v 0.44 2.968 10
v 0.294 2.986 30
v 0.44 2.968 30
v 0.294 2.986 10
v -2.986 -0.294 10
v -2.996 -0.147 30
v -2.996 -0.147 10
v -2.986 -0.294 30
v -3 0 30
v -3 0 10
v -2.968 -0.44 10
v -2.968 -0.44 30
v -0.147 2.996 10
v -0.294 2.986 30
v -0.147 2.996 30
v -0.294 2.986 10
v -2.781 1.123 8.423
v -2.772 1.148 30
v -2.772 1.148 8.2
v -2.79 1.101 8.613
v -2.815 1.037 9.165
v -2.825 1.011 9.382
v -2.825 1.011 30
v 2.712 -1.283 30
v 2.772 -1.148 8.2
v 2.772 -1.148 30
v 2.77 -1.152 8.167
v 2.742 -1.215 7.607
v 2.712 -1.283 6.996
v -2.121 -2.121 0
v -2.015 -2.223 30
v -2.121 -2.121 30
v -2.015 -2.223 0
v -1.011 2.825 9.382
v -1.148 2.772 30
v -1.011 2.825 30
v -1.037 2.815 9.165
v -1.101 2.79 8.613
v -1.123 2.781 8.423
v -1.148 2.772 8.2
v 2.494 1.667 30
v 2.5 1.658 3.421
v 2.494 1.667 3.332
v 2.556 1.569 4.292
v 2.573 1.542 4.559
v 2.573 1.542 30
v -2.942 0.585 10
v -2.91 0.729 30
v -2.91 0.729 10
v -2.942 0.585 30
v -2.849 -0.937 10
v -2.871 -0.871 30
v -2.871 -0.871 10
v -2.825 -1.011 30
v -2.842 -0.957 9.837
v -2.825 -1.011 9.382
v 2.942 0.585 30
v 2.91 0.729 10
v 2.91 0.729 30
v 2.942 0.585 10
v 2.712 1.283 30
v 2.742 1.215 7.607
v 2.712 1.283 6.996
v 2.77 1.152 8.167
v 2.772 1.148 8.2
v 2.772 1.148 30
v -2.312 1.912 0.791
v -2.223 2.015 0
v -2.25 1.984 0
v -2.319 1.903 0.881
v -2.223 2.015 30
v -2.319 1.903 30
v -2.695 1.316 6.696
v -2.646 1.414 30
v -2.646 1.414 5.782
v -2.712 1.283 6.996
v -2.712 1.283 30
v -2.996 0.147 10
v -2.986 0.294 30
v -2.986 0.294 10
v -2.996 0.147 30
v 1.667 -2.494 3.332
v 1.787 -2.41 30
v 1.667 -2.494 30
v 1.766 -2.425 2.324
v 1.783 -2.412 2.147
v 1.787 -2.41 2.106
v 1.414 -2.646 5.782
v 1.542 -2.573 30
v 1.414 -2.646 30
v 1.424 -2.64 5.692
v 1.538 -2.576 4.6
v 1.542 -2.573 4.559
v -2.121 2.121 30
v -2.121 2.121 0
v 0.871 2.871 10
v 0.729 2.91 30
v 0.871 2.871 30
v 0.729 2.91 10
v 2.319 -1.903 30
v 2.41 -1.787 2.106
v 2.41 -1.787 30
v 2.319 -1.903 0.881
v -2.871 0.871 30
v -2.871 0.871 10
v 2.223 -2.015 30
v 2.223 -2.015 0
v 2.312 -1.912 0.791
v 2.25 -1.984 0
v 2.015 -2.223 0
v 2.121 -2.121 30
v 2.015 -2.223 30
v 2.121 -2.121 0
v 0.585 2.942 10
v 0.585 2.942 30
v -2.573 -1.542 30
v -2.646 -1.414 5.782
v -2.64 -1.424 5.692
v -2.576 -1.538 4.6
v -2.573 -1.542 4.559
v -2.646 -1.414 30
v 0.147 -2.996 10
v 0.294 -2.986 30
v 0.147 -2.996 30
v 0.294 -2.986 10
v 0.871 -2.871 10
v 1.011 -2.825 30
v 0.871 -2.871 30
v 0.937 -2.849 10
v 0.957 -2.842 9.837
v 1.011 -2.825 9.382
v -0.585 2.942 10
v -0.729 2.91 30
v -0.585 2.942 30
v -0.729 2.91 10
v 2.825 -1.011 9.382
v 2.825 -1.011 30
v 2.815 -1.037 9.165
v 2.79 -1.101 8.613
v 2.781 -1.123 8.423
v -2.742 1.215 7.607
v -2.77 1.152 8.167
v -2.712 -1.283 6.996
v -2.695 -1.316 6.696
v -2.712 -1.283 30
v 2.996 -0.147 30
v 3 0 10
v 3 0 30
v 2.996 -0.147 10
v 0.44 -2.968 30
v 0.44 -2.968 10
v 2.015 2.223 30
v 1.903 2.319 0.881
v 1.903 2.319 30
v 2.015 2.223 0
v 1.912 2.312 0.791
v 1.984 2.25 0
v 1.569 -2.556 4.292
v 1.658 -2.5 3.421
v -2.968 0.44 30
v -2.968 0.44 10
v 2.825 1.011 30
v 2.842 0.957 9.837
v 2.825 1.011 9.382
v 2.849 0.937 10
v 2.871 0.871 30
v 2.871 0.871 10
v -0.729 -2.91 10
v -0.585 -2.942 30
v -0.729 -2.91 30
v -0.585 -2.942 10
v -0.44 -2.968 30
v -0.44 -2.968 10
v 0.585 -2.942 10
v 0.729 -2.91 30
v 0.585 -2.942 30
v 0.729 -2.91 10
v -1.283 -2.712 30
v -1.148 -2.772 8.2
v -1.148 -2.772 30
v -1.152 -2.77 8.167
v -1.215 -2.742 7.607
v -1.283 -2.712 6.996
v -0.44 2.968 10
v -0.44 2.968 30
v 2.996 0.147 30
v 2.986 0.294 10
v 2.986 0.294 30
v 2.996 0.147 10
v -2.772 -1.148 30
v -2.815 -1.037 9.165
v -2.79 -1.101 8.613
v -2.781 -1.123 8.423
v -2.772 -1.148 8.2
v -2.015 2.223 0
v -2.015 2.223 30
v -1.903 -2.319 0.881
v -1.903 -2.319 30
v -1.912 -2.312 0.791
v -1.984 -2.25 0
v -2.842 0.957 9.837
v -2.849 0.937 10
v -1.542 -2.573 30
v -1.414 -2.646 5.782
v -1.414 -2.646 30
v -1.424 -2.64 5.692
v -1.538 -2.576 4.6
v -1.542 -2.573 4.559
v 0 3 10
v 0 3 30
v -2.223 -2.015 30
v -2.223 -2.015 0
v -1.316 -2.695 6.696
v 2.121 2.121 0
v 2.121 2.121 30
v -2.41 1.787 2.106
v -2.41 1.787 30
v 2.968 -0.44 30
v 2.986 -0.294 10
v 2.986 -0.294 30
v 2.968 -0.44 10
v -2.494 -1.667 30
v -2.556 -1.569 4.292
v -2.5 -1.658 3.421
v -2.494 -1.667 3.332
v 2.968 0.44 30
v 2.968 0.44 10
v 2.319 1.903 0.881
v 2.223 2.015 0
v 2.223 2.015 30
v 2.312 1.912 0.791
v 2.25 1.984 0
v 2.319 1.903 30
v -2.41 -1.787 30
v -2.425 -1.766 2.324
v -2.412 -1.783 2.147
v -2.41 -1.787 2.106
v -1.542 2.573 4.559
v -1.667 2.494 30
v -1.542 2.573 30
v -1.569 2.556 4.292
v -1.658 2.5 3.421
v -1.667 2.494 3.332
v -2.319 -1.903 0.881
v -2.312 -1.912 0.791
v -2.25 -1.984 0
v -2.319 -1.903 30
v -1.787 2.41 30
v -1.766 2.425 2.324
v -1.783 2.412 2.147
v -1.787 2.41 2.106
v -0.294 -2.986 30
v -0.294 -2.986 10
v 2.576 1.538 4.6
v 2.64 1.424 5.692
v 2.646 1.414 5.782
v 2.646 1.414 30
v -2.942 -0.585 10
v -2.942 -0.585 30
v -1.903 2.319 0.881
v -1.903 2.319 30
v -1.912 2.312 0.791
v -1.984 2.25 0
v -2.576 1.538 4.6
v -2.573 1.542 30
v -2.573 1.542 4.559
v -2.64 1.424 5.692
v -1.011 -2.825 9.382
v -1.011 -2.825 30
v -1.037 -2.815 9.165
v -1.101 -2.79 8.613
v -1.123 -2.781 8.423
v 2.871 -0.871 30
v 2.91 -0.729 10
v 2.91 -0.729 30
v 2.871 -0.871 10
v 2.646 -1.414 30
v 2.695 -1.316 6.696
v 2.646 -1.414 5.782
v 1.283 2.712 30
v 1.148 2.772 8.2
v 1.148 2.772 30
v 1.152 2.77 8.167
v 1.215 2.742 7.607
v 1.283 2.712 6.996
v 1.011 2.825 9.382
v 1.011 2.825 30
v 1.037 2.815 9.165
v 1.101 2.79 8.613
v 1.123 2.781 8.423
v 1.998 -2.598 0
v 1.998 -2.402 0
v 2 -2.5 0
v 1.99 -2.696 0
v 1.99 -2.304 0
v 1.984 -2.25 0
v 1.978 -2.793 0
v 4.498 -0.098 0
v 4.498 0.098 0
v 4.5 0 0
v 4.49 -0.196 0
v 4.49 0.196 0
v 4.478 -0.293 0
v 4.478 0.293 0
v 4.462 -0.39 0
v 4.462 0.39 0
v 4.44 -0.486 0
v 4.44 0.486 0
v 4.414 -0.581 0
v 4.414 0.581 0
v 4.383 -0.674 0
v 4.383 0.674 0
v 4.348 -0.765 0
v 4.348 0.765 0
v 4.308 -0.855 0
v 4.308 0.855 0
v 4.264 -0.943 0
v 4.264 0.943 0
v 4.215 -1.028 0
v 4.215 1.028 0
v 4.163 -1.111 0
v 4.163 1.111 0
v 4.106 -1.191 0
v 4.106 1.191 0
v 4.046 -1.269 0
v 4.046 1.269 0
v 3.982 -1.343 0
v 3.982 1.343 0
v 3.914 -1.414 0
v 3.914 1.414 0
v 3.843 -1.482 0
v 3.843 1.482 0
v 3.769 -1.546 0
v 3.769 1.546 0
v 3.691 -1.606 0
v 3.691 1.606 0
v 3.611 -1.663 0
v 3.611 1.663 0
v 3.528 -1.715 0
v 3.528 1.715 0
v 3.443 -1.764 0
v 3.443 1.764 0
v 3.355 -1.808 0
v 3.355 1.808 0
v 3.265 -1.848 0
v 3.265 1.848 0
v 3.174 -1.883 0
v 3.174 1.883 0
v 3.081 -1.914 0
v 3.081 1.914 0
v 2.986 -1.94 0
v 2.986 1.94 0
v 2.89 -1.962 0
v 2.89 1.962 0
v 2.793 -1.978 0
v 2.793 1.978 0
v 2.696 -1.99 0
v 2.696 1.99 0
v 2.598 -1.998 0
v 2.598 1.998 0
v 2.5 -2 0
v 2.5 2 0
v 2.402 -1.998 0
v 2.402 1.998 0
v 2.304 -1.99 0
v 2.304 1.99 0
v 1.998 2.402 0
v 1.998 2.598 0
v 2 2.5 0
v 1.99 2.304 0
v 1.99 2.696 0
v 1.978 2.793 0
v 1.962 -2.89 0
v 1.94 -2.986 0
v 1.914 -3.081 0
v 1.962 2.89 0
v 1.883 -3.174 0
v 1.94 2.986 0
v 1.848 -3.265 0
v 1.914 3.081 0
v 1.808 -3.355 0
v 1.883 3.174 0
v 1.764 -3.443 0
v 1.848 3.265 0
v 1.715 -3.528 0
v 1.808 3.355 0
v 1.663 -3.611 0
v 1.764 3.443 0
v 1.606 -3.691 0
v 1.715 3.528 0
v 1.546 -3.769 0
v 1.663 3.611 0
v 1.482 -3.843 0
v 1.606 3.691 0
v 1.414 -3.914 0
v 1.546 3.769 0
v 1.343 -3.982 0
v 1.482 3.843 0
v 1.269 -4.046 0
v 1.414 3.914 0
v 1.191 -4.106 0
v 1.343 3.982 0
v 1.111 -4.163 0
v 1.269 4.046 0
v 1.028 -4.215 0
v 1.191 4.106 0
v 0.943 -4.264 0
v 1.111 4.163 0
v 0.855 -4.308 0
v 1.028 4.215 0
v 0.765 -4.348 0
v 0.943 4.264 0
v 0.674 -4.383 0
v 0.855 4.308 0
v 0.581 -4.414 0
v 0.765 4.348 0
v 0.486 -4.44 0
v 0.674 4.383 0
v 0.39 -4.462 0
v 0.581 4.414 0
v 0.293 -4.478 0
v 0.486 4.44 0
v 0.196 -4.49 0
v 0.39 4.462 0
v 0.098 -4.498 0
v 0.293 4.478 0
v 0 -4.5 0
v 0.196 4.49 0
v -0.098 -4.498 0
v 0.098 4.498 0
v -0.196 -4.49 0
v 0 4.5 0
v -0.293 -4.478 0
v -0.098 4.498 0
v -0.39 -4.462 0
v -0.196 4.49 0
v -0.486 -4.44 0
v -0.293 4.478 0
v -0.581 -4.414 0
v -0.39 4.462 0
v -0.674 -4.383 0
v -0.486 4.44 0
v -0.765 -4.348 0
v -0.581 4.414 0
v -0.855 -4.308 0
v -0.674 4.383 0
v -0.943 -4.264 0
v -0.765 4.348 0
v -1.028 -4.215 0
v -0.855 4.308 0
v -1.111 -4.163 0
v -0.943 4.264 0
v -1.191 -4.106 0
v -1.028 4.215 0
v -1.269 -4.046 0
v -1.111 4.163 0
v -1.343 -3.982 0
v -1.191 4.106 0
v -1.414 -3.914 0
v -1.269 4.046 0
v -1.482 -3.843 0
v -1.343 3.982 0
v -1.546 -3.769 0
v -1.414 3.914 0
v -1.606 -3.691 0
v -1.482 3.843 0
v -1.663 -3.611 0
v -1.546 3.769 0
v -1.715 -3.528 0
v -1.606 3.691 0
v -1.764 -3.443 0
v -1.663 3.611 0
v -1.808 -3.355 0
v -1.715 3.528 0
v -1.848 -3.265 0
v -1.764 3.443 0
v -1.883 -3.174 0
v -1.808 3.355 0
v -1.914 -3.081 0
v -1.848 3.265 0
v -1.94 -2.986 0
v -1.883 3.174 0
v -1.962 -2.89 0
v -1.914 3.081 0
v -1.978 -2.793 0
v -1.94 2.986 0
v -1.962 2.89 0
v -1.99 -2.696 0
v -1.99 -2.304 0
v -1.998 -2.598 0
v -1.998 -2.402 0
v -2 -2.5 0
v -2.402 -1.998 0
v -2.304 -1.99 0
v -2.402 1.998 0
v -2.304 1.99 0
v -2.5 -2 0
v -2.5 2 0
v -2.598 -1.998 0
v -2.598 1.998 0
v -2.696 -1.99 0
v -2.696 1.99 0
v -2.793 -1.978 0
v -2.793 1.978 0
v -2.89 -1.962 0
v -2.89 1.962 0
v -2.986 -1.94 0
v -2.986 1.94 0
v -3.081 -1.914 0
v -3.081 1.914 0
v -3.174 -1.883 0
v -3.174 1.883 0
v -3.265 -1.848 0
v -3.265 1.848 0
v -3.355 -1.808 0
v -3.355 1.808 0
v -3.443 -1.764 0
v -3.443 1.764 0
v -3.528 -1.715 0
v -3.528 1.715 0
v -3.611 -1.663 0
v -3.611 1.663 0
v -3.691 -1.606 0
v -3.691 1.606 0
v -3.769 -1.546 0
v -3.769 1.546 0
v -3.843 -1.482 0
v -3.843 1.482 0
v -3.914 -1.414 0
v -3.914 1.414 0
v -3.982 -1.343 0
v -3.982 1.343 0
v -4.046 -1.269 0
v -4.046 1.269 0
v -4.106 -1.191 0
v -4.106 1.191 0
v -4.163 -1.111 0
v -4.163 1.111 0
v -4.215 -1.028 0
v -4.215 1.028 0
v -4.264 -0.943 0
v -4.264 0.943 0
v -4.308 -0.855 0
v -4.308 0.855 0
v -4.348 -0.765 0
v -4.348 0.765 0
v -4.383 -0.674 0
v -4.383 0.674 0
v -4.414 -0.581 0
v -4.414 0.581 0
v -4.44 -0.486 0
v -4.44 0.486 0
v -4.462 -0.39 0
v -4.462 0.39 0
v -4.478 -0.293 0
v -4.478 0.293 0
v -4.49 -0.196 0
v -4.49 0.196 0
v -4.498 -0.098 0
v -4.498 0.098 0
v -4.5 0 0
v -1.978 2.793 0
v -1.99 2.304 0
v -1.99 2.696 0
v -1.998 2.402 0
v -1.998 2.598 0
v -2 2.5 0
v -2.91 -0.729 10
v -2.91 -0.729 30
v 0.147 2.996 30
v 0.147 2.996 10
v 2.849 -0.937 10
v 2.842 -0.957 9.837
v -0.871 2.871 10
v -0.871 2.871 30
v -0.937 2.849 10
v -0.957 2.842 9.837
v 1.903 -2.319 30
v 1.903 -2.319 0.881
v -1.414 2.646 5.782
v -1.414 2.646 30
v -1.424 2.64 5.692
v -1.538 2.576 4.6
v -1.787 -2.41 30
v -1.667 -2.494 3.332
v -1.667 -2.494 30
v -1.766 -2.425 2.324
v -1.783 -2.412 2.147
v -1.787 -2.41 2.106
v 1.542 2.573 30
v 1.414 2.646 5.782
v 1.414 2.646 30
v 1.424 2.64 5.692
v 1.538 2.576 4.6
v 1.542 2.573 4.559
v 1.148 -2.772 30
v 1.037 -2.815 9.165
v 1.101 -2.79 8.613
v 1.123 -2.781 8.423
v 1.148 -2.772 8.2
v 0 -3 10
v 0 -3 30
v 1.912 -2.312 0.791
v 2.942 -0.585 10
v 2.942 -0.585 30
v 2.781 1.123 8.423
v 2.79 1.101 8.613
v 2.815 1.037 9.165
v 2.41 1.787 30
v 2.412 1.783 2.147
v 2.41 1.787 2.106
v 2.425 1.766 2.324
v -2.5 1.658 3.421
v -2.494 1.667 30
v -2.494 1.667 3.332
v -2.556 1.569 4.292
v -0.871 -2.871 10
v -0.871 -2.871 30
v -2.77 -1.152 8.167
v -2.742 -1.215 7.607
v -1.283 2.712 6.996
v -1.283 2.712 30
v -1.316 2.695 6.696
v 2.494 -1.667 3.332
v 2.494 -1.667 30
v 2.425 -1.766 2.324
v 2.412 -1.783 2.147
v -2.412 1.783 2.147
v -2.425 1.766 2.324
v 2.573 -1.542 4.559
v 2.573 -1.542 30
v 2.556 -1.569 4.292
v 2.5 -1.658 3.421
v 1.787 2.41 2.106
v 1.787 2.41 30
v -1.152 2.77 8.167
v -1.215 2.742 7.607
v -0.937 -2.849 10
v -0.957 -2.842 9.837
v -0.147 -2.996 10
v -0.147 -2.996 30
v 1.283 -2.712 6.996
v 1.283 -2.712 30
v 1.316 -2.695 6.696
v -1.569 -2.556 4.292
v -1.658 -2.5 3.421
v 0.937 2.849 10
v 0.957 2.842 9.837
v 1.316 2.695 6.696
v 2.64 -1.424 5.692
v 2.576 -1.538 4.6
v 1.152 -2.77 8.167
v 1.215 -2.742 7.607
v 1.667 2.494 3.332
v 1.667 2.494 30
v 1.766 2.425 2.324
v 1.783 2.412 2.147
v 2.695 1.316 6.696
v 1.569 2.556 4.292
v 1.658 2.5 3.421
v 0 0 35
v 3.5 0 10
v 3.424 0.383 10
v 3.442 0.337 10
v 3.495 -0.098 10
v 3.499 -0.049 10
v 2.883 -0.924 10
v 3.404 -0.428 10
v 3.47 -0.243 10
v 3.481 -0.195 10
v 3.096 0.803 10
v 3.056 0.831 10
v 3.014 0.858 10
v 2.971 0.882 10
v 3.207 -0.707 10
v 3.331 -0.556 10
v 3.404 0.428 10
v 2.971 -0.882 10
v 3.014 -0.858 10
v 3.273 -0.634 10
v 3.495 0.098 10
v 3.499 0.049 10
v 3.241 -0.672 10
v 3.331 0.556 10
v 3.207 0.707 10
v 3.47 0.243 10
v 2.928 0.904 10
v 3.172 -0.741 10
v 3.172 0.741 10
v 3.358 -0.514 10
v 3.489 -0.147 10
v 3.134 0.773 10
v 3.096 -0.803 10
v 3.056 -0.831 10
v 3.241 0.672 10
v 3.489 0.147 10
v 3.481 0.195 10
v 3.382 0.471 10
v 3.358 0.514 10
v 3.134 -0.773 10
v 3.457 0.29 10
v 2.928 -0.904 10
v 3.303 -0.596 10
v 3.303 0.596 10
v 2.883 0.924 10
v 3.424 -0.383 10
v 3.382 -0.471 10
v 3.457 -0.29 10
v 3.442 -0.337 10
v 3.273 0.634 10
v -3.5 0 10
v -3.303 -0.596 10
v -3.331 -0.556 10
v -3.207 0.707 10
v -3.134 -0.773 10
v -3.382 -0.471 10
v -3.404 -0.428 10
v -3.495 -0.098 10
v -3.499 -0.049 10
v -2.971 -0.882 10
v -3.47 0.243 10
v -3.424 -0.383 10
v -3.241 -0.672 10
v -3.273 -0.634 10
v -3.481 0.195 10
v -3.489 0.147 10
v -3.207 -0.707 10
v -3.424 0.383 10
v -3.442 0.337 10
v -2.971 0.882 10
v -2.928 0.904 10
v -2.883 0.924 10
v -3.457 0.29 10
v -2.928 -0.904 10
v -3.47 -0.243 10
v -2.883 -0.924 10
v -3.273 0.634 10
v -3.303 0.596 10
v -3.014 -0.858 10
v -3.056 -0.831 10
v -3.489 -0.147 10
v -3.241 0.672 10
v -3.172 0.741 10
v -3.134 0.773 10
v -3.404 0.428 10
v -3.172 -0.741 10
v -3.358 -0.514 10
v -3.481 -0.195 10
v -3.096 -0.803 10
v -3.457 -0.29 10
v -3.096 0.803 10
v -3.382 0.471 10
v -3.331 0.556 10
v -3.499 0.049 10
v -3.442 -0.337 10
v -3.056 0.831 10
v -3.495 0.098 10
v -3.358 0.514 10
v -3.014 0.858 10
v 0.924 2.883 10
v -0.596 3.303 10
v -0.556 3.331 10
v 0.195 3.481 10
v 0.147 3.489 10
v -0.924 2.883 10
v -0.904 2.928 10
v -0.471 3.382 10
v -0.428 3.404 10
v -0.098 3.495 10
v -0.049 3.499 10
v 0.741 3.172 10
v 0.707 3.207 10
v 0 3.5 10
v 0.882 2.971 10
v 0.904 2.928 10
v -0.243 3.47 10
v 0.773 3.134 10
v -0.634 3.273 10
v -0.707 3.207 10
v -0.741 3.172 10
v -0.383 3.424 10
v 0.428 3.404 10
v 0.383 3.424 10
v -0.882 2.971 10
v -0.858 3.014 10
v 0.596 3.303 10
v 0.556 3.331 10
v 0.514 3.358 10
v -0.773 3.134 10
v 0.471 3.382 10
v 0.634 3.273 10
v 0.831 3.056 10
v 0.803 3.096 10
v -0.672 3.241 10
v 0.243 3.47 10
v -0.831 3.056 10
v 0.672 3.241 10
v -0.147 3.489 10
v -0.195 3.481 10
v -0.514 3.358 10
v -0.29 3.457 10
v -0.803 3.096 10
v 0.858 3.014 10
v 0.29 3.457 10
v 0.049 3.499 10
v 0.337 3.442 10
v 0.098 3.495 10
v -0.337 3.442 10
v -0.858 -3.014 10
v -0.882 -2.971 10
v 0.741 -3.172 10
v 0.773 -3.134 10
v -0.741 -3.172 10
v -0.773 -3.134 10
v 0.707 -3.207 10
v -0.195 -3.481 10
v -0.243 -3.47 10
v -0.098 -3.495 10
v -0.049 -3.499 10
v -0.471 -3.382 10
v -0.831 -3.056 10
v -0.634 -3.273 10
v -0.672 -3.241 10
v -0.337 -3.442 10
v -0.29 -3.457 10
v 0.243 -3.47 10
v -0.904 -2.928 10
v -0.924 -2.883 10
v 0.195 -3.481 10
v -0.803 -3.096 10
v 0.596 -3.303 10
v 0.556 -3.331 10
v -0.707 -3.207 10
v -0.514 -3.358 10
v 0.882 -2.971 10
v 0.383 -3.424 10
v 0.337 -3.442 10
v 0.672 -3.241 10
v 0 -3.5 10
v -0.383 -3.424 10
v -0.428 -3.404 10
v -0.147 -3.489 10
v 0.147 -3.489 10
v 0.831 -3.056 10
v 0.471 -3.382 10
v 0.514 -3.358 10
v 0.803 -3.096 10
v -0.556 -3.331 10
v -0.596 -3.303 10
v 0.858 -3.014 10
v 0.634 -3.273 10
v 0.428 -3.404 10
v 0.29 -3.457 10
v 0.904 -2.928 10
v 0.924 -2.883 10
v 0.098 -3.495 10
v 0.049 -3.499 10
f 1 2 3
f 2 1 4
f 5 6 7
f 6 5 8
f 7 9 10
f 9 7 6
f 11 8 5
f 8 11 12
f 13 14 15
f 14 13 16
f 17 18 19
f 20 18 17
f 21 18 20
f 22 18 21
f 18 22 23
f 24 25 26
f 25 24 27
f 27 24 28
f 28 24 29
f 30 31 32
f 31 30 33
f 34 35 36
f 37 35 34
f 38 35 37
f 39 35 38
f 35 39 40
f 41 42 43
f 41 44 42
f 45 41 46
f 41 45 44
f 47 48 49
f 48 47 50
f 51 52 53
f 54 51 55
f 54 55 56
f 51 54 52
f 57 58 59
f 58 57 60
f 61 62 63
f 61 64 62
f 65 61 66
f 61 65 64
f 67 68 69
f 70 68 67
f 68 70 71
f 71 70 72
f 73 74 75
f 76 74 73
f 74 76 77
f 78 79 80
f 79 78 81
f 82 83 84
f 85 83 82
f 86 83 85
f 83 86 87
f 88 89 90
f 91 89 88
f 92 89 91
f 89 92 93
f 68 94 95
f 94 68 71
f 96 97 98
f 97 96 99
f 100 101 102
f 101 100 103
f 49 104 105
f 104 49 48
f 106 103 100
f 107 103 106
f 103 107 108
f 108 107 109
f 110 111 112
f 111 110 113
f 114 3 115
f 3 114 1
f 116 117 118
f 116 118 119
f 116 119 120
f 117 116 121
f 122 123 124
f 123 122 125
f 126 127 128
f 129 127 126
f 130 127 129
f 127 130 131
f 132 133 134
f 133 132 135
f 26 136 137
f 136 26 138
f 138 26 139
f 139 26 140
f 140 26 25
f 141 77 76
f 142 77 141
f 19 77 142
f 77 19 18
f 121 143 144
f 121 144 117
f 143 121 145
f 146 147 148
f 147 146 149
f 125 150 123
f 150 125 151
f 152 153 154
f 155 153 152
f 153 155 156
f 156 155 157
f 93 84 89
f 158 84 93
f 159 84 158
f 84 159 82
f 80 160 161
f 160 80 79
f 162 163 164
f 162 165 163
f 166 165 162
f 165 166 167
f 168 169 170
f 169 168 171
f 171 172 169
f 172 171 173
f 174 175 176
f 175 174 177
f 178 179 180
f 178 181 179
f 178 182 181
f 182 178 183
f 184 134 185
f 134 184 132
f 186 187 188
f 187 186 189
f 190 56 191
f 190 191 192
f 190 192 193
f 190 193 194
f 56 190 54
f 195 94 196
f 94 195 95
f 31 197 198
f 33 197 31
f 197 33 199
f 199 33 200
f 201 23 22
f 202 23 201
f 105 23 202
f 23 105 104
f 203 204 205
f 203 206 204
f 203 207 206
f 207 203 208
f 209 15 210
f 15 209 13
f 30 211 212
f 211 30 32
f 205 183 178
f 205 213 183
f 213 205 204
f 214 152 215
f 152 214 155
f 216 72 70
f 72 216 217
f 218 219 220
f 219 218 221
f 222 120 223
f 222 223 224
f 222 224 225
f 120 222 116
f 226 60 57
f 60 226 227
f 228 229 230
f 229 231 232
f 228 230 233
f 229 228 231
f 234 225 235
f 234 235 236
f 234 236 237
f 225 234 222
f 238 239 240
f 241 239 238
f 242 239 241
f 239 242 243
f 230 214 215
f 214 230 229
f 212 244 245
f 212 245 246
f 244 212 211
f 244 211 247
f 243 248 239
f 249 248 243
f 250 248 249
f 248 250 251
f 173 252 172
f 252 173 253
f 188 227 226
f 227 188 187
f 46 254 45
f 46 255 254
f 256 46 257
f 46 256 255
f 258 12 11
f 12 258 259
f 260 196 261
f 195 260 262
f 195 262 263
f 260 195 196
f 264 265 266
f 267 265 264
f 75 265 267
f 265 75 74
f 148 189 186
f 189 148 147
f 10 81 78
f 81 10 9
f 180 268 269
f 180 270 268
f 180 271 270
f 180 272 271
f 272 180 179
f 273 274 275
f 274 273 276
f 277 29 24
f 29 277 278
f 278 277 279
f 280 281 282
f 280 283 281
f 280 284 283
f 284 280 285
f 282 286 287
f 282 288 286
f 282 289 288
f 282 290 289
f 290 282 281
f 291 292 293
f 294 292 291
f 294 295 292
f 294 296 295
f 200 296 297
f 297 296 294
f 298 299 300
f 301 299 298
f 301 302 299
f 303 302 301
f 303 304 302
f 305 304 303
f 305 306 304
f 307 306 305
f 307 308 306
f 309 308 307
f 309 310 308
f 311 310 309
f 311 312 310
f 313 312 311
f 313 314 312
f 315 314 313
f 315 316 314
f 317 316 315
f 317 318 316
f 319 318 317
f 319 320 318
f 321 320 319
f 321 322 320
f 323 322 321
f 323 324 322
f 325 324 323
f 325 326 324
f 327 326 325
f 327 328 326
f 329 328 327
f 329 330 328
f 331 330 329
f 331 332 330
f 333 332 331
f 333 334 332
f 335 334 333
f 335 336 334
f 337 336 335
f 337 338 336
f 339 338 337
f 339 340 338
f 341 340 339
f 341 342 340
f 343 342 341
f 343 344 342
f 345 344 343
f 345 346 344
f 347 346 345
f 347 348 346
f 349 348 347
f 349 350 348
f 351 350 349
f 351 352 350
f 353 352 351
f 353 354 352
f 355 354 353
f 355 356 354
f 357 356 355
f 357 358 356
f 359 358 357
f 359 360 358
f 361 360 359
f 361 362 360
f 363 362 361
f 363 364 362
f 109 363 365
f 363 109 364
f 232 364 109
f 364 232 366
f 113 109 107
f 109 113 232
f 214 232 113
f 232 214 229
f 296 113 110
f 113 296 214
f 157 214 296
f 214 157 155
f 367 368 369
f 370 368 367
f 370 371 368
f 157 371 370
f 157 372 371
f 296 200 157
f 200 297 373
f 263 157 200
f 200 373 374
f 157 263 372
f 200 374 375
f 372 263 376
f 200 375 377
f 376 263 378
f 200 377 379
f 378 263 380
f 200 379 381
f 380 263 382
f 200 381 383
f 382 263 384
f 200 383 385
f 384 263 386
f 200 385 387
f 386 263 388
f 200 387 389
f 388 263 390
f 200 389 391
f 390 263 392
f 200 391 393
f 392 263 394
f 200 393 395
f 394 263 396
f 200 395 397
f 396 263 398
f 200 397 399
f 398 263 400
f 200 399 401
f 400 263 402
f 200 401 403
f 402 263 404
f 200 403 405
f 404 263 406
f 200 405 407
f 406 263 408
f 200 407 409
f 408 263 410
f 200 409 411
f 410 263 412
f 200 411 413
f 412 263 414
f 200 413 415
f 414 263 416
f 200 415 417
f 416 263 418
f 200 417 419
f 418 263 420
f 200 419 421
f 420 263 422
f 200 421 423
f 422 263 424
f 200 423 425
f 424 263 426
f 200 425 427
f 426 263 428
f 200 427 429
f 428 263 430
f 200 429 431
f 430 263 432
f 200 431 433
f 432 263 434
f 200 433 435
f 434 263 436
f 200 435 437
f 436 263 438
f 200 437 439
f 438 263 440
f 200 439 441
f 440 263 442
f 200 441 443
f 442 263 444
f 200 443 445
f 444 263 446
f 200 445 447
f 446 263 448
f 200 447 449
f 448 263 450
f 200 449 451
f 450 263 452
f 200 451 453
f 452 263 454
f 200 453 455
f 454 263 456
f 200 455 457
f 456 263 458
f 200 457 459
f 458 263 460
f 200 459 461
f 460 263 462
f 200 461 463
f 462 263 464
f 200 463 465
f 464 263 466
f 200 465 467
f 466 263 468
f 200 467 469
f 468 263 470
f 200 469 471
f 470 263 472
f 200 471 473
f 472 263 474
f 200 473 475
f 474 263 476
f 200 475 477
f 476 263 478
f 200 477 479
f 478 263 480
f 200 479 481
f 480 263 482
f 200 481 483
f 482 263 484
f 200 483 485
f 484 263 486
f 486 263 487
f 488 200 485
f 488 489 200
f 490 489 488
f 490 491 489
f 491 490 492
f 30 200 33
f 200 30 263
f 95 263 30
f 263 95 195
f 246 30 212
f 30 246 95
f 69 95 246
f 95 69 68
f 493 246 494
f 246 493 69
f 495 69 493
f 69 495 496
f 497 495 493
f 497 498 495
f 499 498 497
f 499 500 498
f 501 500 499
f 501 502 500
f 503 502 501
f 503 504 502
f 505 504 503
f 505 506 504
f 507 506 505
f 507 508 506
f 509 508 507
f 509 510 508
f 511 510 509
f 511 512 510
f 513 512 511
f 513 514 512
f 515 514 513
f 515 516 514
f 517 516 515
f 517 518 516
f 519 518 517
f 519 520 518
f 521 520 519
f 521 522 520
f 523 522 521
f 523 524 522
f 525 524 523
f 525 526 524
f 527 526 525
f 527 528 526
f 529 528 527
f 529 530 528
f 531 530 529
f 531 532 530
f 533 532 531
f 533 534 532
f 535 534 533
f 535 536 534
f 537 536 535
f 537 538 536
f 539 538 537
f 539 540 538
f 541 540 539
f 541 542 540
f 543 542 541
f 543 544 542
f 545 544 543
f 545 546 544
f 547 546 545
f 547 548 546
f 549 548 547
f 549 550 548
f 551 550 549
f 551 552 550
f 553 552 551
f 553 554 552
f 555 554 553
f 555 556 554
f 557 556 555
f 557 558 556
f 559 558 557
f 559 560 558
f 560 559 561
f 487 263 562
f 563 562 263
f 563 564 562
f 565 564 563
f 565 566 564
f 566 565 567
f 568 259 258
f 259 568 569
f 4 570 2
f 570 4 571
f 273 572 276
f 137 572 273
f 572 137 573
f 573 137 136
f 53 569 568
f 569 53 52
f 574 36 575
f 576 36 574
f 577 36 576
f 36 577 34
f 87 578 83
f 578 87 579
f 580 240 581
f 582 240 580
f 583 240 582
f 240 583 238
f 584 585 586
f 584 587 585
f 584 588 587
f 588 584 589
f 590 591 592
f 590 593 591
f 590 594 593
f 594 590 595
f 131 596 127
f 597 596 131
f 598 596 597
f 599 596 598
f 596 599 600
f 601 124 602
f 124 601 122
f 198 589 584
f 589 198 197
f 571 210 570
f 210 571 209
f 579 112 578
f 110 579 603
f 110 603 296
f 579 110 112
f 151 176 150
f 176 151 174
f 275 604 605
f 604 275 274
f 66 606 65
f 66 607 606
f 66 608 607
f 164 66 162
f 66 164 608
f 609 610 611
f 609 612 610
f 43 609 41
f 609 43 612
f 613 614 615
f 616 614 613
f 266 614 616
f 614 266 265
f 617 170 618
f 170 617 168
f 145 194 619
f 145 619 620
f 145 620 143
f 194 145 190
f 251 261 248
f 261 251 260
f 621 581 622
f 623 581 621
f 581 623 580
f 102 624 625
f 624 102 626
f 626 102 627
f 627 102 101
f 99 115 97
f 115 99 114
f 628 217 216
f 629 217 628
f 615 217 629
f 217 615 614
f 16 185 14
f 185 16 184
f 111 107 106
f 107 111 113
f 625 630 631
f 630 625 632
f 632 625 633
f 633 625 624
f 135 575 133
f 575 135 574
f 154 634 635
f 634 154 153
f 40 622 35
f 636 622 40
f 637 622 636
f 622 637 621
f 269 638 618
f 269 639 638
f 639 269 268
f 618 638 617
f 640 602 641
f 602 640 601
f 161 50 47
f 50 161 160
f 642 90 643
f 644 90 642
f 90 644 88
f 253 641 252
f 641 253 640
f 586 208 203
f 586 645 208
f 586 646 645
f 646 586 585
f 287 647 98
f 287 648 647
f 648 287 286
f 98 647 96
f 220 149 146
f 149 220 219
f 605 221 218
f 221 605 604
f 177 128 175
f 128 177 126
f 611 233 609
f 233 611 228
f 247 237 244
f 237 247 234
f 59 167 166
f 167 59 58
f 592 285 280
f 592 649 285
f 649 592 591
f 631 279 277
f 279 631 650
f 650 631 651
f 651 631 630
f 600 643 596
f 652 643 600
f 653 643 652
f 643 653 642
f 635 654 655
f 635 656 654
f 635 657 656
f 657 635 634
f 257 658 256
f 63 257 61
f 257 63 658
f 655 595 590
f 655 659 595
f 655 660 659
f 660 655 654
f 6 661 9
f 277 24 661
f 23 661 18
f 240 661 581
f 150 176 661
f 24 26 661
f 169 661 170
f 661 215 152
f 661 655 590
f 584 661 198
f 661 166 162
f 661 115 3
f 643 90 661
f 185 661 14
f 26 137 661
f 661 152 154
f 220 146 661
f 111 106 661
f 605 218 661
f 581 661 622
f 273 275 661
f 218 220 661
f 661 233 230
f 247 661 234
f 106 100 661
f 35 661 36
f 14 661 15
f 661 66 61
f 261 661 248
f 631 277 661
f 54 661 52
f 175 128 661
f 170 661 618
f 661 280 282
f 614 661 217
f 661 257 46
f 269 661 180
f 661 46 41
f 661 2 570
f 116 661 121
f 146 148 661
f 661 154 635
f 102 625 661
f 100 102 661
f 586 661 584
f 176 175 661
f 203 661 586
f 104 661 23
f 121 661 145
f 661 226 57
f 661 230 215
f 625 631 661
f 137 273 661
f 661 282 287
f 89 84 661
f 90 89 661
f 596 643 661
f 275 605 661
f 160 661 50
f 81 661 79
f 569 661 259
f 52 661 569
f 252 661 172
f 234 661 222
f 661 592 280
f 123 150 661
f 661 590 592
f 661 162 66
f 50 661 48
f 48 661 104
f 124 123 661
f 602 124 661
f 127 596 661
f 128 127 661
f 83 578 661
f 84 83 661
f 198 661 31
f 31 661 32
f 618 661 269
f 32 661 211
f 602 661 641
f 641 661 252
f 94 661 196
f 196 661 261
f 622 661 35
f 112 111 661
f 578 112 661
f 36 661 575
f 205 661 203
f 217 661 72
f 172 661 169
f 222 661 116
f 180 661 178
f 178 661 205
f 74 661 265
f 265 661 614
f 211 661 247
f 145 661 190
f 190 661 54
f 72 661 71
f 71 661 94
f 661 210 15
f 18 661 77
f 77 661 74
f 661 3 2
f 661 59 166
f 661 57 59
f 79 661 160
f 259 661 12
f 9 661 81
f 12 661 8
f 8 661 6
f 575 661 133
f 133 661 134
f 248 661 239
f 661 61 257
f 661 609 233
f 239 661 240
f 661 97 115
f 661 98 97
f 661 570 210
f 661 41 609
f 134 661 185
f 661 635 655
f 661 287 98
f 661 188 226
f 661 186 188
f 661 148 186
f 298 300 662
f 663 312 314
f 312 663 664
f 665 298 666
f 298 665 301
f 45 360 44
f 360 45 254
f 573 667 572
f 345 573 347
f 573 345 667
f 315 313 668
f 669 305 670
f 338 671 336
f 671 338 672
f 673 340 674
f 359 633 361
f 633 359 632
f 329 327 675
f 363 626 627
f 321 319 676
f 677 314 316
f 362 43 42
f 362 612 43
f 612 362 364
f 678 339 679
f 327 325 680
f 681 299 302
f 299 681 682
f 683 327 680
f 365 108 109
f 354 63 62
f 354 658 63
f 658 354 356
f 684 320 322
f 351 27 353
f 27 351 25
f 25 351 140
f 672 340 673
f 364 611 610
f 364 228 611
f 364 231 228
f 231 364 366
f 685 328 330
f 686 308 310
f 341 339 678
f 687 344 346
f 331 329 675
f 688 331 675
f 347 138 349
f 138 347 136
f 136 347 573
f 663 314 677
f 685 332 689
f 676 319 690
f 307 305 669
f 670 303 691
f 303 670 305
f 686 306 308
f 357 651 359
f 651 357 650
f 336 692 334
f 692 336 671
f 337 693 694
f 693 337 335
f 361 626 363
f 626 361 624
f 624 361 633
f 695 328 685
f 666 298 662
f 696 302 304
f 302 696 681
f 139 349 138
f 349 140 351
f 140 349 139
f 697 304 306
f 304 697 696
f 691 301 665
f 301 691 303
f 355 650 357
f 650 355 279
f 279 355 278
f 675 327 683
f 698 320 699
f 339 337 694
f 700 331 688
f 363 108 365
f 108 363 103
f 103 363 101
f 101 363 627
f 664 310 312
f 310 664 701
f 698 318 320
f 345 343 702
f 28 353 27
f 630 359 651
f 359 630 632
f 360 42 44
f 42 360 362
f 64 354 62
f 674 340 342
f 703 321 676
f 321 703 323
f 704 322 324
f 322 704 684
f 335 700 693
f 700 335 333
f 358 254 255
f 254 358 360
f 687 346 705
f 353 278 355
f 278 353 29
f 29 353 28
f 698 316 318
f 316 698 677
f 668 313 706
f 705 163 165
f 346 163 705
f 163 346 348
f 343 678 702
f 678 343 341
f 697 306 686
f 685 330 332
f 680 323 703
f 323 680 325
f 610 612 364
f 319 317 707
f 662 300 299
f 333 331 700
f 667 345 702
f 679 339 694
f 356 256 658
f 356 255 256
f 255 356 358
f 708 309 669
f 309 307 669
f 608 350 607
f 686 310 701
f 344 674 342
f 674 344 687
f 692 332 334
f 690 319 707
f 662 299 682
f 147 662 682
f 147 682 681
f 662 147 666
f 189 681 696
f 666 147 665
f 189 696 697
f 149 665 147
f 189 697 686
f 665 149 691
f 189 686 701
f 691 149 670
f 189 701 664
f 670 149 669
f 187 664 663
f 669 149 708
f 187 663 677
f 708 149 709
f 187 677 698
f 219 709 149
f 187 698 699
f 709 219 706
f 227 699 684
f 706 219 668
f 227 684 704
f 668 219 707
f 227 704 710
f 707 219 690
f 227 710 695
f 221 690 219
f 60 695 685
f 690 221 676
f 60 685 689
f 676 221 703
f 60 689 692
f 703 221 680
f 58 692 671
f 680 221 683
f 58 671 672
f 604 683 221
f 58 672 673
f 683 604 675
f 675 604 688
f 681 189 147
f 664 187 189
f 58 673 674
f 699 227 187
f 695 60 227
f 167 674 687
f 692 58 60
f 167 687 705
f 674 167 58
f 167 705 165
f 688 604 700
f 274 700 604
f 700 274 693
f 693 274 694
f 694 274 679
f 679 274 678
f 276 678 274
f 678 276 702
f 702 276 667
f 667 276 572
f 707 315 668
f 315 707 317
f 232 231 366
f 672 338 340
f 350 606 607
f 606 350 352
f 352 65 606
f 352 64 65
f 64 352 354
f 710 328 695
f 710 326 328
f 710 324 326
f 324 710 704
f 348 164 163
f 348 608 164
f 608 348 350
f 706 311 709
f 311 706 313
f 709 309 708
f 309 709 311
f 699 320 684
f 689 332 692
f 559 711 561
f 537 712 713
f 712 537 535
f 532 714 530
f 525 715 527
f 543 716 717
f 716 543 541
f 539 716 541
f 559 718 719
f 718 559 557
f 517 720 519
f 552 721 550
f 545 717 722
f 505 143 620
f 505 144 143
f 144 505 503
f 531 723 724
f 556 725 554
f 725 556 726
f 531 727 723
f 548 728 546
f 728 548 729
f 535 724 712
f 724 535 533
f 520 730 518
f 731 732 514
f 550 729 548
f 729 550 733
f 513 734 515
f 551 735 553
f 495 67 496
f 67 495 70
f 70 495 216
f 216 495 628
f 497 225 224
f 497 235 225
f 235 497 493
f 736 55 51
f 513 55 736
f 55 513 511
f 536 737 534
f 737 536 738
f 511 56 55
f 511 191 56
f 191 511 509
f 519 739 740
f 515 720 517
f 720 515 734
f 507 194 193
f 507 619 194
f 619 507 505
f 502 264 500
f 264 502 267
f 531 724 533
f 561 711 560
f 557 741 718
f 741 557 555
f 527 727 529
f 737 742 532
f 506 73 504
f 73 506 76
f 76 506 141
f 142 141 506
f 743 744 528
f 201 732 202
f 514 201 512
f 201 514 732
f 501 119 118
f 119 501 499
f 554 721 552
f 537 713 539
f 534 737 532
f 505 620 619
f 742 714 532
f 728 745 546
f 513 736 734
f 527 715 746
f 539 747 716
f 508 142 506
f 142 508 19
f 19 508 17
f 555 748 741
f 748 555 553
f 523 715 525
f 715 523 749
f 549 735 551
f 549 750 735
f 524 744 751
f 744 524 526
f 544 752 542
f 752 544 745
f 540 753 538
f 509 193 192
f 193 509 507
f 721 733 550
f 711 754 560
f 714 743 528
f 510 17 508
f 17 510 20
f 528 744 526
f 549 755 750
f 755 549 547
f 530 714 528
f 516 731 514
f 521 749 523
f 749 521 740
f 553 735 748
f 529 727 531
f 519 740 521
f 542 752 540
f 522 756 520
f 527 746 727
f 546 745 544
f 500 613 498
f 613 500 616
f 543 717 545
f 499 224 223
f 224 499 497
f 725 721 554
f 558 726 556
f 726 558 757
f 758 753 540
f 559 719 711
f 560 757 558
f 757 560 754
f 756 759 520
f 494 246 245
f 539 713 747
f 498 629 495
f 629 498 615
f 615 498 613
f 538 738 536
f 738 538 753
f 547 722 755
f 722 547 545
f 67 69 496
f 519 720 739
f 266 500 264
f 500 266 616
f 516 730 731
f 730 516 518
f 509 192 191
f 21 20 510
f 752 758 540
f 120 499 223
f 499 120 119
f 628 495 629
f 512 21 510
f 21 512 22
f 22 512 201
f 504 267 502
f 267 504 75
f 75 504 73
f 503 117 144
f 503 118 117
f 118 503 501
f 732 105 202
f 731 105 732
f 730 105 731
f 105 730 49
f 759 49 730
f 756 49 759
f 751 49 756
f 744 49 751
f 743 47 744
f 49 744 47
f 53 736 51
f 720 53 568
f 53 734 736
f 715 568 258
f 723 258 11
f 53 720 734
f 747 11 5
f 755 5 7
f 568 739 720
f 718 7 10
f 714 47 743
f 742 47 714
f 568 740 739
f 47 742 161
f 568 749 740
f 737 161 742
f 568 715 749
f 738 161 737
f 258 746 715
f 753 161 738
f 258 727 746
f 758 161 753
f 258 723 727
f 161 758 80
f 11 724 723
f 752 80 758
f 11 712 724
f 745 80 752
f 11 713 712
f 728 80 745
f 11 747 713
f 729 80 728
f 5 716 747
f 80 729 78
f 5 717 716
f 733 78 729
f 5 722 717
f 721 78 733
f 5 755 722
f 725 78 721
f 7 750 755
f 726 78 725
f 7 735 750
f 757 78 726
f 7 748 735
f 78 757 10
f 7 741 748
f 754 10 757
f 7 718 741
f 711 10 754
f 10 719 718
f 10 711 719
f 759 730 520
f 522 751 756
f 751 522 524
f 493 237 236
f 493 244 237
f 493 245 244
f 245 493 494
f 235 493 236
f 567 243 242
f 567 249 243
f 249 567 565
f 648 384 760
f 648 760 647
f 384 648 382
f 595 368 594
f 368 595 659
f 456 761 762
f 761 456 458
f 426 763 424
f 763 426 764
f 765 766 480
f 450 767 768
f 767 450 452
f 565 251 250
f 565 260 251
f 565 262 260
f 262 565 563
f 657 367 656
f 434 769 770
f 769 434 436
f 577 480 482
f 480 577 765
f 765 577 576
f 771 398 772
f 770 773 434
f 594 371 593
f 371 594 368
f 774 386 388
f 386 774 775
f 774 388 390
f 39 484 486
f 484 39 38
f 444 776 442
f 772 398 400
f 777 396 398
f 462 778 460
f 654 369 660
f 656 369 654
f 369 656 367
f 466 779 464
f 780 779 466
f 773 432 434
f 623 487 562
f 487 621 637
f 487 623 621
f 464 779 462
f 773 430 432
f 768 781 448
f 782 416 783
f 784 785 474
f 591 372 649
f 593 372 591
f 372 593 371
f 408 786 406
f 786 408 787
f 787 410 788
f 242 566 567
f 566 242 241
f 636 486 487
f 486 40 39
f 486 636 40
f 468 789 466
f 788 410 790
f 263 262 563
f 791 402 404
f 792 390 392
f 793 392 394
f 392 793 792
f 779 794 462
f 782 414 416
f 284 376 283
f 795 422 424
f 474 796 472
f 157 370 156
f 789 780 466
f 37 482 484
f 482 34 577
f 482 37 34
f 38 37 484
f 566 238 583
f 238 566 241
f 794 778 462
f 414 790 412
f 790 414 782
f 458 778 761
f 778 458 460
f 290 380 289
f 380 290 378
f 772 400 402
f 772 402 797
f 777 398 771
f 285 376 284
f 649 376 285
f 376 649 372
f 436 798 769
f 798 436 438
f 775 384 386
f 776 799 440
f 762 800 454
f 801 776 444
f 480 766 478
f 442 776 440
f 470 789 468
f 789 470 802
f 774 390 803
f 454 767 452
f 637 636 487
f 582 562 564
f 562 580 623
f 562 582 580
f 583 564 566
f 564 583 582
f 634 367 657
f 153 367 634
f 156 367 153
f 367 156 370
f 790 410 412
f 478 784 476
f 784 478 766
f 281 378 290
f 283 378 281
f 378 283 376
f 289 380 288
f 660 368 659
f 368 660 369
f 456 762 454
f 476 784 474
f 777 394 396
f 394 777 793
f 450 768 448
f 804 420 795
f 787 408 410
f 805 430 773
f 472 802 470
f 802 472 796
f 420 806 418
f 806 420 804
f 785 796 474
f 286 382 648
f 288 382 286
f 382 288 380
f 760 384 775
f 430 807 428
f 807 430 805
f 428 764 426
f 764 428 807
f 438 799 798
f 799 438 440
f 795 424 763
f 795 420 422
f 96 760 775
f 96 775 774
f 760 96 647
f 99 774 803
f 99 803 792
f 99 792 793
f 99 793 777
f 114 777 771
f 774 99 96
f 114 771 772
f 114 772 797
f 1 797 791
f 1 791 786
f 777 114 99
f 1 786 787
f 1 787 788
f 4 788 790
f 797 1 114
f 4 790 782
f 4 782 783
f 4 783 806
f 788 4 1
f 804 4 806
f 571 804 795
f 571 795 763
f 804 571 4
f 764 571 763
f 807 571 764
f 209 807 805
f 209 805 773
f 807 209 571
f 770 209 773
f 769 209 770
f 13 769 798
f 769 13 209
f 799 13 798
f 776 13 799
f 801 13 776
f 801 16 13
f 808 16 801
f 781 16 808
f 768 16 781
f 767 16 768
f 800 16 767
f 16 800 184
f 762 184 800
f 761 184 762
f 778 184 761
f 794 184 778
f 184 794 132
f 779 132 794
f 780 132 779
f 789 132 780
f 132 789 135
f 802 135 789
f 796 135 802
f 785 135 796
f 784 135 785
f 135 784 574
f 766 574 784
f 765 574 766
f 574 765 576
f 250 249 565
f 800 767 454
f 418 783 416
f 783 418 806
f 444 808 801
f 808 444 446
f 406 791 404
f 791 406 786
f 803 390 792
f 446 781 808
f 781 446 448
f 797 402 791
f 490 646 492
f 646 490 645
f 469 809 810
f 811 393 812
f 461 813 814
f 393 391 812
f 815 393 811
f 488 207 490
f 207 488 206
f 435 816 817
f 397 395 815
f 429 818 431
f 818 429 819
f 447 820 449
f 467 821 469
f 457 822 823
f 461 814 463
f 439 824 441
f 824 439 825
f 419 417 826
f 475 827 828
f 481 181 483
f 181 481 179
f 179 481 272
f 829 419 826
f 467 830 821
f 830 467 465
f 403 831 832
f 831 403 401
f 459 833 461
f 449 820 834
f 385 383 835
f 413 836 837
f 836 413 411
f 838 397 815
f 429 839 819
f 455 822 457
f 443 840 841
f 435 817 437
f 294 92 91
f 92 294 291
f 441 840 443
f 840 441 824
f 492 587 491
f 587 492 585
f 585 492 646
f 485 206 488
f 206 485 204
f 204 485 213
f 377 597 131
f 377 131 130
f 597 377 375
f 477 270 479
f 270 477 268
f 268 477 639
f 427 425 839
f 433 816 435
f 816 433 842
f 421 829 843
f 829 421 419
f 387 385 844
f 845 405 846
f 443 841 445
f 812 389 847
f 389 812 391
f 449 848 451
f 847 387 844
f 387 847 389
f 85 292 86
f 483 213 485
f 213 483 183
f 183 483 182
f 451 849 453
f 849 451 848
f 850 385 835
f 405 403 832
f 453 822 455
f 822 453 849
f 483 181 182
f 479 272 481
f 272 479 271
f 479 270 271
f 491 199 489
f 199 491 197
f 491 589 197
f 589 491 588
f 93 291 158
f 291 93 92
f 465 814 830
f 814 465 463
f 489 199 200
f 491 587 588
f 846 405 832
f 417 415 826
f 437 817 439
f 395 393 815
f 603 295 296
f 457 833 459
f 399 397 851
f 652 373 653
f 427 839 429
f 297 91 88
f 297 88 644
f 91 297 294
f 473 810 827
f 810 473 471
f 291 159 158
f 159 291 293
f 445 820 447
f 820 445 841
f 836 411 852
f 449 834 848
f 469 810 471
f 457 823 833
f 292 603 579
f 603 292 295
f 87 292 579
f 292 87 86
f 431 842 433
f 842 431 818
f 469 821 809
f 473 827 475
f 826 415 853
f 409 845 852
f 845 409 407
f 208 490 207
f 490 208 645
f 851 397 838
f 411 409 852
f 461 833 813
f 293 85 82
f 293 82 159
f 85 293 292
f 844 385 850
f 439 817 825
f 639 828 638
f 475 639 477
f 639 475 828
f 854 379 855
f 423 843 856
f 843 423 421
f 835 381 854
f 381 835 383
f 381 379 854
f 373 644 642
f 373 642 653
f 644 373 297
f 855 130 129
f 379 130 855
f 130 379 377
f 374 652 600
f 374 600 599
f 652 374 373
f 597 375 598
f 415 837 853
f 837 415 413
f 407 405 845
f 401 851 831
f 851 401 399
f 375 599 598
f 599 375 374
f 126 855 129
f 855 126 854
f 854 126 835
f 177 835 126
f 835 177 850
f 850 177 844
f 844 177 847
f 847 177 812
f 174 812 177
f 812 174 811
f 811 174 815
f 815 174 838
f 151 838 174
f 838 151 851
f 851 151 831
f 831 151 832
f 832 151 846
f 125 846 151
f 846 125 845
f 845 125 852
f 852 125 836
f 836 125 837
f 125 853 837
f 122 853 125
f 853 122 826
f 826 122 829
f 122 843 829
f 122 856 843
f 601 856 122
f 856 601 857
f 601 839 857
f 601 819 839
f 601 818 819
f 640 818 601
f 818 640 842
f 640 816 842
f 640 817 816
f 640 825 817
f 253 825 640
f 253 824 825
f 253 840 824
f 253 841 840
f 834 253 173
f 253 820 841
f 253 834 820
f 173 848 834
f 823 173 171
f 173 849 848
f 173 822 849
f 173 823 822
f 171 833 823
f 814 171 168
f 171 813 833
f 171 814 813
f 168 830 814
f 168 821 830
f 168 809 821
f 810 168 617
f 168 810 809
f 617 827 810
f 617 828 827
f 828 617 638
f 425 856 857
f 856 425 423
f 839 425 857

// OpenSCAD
$fn=128;
  module rocket(hh=5, eh=10, rh=30, z=-1) {
    rotate([0,0,180]) {
    cylinder(h=rh, r=3);
    translate([0,0,rh]) cylinder(h=hh, r1=3, r2=0);
    translate([-2.5,0,z]) cylinder(h=eh, r1=2, r2=1);
    translate([2.5,0,z]) cylinder(h=eh, r1=2, r2=1);
    translate([0,-2.5,z]) cylinder(h=eh, r1=2, r2=1);
    translate([0,2.5,z]) cylinder(h=eh, r1=2, r2=1);  
    }
  }

  rocket(z=0);
